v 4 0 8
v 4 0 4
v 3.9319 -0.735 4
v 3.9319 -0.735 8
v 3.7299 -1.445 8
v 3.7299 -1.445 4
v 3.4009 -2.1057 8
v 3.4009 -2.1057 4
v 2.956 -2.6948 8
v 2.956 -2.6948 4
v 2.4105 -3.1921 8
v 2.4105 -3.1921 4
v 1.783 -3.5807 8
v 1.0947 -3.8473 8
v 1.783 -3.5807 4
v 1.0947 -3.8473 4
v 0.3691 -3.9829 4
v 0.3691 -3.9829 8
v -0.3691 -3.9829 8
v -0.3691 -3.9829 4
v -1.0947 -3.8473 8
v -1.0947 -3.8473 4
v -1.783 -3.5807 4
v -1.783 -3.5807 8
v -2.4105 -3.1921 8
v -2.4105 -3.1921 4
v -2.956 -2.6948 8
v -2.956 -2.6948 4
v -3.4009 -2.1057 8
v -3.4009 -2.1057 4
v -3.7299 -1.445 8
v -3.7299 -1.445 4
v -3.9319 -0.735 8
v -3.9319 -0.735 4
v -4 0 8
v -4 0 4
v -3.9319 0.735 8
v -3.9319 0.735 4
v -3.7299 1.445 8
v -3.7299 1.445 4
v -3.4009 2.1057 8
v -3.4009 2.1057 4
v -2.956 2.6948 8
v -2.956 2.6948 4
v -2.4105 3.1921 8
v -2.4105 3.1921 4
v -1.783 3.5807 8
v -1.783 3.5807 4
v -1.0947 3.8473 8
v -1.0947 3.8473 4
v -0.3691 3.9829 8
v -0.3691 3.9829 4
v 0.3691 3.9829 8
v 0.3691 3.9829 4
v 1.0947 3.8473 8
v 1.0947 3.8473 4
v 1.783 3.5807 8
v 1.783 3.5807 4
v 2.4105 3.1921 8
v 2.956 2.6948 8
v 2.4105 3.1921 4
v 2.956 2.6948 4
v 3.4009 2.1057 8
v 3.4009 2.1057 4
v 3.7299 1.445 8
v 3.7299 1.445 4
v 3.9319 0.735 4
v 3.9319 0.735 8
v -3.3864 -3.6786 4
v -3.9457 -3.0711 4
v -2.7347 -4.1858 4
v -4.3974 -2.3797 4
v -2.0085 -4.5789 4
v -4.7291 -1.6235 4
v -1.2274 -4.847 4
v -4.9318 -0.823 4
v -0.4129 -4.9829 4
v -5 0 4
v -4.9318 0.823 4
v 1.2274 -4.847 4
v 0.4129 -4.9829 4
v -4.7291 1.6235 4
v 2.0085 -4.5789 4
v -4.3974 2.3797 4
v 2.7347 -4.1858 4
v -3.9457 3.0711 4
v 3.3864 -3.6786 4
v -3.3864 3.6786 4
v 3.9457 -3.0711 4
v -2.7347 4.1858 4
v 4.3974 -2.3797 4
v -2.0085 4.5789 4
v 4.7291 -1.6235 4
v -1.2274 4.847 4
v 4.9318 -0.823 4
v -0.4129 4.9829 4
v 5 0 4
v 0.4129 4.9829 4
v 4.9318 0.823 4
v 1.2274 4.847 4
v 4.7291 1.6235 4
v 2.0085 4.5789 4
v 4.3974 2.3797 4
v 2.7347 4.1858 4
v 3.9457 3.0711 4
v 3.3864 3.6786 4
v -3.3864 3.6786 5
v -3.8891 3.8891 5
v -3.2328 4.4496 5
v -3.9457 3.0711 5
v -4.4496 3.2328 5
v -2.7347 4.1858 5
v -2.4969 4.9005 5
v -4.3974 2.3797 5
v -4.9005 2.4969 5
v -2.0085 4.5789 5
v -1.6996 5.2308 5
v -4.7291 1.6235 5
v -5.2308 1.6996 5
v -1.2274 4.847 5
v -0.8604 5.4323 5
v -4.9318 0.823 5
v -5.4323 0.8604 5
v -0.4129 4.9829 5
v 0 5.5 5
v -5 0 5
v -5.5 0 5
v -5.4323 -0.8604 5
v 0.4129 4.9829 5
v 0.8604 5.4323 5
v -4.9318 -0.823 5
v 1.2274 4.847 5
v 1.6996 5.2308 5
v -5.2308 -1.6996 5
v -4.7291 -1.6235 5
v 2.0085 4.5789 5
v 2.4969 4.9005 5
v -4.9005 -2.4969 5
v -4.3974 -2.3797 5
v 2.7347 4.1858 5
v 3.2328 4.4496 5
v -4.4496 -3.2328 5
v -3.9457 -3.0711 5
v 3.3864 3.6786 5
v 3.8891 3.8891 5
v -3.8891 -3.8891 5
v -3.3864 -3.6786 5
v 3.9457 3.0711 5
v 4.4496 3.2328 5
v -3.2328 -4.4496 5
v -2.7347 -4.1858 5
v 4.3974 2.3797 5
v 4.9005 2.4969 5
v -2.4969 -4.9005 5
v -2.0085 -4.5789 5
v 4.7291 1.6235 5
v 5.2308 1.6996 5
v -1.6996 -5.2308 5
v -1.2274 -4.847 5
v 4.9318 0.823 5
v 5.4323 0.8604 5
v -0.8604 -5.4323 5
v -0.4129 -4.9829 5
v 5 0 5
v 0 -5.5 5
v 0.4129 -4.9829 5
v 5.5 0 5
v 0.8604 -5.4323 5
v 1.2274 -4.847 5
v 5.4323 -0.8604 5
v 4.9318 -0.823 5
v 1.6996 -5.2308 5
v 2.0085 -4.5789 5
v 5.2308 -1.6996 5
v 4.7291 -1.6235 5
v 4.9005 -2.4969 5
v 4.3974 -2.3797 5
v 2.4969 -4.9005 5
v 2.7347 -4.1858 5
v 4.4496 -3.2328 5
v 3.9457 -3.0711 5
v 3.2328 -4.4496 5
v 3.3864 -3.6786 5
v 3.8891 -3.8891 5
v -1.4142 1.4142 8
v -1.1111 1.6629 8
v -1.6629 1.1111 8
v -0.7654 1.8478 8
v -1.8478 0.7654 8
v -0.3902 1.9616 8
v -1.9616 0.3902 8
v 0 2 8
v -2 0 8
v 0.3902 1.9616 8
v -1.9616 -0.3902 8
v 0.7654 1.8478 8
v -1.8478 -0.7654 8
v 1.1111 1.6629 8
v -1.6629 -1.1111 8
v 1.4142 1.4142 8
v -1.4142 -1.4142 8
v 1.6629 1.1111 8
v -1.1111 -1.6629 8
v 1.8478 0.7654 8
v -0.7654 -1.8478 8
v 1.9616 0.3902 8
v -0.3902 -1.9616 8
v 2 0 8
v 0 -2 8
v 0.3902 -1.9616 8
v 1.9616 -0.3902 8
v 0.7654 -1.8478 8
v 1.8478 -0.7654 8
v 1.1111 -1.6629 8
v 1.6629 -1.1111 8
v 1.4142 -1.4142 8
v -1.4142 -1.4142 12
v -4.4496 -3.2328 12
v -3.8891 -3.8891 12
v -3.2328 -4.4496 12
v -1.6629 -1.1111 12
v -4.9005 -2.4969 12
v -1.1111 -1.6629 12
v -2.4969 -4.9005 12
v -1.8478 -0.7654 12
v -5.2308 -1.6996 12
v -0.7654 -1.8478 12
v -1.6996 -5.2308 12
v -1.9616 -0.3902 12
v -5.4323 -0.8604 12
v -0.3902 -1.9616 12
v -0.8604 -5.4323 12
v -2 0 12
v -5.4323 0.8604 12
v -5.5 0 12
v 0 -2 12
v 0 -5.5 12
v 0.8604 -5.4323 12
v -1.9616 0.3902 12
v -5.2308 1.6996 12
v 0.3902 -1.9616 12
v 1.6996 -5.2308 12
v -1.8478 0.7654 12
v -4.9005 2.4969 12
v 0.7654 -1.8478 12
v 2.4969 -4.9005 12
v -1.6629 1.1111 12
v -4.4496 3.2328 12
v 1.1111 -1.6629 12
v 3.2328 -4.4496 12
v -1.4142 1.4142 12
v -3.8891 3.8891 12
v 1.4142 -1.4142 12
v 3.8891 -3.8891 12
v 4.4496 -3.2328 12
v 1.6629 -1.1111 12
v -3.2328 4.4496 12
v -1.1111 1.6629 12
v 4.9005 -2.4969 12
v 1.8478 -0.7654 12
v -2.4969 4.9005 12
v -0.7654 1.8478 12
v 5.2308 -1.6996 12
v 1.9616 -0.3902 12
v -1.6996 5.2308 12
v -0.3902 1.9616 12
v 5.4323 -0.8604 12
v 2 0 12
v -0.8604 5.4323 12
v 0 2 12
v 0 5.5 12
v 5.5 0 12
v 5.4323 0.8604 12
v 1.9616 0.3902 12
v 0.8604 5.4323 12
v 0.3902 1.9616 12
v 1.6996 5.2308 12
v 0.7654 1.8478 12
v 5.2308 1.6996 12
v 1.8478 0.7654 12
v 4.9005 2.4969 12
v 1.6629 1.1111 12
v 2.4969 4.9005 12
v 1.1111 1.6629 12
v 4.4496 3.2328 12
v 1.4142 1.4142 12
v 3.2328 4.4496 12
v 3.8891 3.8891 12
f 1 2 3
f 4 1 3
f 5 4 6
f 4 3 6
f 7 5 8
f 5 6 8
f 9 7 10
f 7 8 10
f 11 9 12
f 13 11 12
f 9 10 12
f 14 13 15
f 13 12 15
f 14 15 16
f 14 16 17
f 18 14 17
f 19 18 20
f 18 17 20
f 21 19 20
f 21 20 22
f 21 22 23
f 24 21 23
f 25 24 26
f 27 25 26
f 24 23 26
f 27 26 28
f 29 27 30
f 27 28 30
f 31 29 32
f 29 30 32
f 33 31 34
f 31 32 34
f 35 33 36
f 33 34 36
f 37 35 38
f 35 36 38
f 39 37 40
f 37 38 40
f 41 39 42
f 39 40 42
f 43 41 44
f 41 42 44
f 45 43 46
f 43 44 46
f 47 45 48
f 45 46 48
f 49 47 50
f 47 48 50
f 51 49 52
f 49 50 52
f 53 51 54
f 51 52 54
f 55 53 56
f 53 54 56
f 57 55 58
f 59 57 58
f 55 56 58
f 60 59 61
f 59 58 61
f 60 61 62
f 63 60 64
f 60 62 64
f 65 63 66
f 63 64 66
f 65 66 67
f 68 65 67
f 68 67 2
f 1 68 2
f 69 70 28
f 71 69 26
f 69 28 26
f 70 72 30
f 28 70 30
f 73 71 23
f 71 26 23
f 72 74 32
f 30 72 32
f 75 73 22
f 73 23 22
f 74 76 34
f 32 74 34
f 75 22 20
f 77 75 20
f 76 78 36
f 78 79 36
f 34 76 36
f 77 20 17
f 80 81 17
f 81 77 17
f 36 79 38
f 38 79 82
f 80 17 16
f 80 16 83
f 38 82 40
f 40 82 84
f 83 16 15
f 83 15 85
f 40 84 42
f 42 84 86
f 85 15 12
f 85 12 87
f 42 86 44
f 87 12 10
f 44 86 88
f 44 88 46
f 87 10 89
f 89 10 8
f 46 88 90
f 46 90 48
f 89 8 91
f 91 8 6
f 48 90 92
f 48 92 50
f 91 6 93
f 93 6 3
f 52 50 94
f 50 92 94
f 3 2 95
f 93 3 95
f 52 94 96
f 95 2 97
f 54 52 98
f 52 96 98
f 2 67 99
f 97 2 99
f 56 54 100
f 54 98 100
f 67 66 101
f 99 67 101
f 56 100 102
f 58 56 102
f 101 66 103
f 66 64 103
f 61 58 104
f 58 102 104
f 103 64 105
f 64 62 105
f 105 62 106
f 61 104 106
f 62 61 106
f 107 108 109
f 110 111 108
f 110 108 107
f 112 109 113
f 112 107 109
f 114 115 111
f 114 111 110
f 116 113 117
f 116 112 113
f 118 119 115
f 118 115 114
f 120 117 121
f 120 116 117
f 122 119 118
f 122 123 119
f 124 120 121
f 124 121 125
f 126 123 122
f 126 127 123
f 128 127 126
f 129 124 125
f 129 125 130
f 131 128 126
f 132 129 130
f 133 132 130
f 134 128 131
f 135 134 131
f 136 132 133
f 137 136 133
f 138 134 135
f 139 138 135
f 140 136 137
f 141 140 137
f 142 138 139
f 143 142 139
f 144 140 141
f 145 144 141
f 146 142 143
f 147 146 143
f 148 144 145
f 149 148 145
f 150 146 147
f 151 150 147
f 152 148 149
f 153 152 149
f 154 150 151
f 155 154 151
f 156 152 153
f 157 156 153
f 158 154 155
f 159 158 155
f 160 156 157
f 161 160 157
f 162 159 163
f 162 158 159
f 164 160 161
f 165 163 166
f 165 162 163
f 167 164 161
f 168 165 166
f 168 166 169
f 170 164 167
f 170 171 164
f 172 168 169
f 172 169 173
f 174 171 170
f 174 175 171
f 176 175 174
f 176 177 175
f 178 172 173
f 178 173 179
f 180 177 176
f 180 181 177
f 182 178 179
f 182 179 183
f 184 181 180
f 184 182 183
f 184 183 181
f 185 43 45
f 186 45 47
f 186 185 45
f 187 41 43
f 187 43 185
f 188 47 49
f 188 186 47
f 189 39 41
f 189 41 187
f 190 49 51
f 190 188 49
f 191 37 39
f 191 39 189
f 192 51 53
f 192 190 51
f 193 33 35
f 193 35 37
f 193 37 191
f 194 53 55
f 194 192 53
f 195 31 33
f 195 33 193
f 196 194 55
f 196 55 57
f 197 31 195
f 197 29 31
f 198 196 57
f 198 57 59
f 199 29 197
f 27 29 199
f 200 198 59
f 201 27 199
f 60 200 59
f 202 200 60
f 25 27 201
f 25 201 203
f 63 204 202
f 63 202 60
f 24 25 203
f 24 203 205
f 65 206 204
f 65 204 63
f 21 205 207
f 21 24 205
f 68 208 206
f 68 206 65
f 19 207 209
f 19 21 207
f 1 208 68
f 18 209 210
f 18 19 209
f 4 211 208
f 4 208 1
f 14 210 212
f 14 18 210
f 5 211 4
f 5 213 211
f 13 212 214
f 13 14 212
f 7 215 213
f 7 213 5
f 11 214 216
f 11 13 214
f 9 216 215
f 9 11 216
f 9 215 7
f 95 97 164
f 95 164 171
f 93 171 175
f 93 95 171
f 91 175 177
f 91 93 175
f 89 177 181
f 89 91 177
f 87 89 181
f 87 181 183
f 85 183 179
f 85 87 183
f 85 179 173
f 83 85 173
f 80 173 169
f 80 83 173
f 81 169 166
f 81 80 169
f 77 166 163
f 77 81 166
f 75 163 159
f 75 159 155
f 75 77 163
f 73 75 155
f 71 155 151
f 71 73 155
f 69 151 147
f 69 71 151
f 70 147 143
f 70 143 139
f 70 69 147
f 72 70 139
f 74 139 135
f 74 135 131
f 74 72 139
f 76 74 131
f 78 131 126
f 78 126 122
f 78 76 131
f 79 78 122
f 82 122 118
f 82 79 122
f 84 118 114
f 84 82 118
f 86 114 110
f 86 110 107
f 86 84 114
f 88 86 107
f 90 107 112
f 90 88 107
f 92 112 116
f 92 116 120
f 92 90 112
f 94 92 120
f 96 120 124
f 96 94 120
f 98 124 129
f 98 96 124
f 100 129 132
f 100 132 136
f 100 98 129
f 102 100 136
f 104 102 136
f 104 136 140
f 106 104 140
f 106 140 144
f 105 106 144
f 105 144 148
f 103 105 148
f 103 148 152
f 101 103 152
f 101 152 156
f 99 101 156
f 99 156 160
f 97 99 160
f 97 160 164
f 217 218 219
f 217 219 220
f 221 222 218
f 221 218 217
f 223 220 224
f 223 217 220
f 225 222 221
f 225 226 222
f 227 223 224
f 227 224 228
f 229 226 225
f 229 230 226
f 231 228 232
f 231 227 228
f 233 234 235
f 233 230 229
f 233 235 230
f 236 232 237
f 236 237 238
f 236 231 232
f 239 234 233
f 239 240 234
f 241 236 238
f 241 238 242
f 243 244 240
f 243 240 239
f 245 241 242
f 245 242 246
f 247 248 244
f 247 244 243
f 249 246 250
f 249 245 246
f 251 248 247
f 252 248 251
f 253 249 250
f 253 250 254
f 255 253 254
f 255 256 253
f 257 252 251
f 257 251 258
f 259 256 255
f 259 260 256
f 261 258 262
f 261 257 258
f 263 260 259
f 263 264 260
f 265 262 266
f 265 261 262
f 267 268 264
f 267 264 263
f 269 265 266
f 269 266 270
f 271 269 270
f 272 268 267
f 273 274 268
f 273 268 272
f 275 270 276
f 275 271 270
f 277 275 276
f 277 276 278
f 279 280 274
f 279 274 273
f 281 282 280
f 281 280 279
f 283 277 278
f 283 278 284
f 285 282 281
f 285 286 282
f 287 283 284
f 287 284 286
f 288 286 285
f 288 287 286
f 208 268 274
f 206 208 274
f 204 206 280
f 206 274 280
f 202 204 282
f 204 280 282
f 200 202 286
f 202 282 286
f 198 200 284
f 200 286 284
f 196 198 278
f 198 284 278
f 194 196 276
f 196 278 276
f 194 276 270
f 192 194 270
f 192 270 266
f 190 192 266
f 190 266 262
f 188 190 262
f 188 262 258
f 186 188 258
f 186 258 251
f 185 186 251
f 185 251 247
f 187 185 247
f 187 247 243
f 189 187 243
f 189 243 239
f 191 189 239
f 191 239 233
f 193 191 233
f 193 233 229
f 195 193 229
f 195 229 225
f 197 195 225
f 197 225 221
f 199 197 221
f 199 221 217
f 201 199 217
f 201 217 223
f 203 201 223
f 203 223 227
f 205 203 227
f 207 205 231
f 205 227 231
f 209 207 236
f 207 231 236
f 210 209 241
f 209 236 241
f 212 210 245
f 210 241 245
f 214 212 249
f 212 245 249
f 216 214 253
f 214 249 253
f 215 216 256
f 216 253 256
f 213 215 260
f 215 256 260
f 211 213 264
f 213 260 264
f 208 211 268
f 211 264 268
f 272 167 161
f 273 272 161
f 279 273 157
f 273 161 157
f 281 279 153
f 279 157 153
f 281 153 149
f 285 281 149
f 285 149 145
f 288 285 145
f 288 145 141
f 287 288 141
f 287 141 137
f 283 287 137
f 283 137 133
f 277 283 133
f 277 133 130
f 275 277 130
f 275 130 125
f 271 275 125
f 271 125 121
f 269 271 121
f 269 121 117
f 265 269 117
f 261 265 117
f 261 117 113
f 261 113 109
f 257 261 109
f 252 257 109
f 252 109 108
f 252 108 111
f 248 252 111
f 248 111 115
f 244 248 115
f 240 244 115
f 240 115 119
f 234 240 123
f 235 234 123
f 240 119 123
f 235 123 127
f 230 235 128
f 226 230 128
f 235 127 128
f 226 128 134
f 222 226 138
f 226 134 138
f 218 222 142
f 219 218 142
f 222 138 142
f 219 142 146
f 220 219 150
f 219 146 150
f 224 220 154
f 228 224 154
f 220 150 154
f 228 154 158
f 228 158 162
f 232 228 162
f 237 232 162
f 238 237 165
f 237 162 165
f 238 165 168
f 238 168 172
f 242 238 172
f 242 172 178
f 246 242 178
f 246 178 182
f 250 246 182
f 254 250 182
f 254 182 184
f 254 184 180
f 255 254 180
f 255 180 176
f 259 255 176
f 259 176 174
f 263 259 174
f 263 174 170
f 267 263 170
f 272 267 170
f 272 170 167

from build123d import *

# Parameters (mm, degrees)
F1_R     = 5.5
F2_DEPTH = 8
F3_R     = 4
F4_DEPTH = 4
F5_R     = 1
F6_DEPTH = 25
F5_R_2   = 2
F7_DEPTH = 5
F8_R     = 5.5
F8_R_2   = 5
F9_DEPTH = 1


with BuildPart() as f2:
    # F1 (on offset) → F2 (new body)
    with BuildSketch(Plane.XY.offset(4)):
        Circle(F1_R)
    extrude(amount=F2_DEPTH)

    # F3 (on face) → F4 (cut)
    with BuildSketch(Plane(origin=(0, 0, 4), x_dir=(1, 0, 0), z_dir=(0, 0, -1))):
        Circle(F3_R)
    extrude(amount=-F4_DEPTH, mode=Mode.SUBTRACT)

    # F5 (on face) → F6 (cut)
    with BuildSketch(Plane.XY.offset(12)):
        Circle(F5_R)
    extrude(amount=-F6_DEPTH, mode=Mode.SUBTRACT)

    # F5 (on face) → F7 (cut)
    with BuildSketch(Plane.XY.offset(12)):
        Circle(F5_R_2)
        Circle(F5_R, mode=Mode.SUBTRACT)
    extrude(amount=-F7_DEPTH, mode=Mode.SUBTRACT)

    # F8 (on face) → F9 (cut)
    with BuildSketch(Plane(origin=(0, 0, 4), x_dir=(1, 0, 0), z_dir=(0, 0, -1))):
        Circle(F8_R)
        Circle(F8_R_2, mode=Mode.SUBTRACT)
    extrude(amount=-F9_DEPTH, mode=Mode.SUBTRACT)


solid = f2.part
